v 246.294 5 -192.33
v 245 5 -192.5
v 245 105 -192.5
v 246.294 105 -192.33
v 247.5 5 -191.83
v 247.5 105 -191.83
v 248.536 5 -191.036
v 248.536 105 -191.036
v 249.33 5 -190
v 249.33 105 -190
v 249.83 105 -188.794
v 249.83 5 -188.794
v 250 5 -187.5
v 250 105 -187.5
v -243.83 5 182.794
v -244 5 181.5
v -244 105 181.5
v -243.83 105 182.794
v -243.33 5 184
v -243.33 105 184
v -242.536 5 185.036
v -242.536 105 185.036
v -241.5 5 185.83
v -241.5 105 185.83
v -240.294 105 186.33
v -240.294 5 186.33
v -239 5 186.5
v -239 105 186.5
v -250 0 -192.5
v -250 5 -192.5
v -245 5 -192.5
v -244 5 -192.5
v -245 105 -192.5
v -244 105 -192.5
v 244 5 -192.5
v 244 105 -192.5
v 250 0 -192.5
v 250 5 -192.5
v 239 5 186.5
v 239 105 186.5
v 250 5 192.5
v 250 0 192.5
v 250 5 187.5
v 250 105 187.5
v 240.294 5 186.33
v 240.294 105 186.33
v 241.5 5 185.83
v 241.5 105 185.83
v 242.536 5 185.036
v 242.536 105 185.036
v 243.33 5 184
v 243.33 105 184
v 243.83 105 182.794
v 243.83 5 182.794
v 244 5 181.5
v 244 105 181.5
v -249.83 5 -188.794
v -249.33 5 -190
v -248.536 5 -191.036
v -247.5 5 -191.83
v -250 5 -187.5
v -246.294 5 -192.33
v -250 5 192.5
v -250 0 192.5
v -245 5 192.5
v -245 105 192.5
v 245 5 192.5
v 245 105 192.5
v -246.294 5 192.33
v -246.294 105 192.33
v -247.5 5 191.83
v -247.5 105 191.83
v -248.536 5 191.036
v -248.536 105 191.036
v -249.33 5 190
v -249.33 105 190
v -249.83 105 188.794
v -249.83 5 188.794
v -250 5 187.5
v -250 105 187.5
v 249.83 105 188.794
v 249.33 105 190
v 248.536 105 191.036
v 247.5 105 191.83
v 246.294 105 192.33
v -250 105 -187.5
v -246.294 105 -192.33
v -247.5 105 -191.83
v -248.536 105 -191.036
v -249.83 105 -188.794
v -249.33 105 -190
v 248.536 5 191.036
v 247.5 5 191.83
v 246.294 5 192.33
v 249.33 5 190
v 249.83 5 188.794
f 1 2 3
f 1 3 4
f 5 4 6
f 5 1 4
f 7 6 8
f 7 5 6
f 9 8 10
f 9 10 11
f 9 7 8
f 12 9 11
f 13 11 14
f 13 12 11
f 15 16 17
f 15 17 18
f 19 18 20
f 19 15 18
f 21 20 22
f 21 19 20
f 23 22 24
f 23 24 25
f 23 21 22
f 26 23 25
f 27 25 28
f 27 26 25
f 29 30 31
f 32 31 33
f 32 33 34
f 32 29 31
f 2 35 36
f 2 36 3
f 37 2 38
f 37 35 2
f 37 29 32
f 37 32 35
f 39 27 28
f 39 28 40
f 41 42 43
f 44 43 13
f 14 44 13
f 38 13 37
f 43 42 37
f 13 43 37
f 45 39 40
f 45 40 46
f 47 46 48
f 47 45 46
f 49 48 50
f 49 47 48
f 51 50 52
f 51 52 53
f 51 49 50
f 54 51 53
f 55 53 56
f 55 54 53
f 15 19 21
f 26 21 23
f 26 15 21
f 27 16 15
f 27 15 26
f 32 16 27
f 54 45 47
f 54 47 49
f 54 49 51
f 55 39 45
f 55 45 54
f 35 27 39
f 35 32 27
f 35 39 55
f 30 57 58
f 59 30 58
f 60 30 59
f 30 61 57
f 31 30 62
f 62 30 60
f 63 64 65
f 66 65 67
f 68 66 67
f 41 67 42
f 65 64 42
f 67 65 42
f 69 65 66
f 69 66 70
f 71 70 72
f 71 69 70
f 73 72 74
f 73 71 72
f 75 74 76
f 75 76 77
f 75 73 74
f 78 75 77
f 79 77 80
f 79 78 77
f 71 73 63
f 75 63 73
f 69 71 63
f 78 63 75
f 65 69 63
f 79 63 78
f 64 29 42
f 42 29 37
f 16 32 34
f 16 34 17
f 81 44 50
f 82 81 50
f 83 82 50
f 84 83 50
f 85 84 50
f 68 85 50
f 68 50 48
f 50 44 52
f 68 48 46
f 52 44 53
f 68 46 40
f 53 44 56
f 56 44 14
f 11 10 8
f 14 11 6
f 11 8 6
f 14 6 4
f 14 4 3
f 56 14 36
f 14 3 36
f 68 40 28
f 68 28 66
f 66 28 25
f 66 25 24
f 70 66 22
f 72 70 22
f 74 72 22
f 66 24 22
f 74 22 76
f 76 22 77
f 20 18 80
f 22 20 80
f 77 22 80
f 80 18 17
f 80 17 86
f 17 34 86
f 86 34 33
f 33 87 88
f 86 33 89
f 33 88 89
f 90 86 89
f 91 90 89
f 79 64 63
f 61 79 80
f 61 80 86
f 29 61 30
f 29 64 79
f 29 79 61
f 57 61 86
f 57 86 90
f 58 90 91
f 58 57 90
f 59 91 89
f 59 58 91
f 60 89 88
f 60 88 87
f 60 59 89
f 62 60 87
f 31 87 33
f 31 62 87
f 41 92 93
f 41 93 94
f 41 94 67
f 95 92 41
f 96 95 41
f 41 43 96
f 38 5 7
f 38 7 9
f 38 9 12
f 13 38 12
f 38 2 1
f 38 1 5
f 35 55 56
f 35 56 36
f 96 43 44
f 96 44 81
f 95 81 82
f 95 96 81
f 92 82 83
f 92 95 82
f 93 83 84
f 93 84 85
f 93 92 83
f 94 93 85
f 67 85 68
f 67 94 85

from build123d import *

# Parameters (mm, degrees)
CROQUIS1_W              = 500
CROQUIS1_H              = 385
SALIENTE_EXTRUIR1_DEPTH = 5
SALIENTE_EXTRUIR2_DEPTH = 100


with BuildPart() as part:
    # Croquis1 → Saliente-Extruir1 (new body)
    with BuildSketch(Plane(origin=(0, 0, 0), x_dir=(1, 0, 0), z_dir=(0, 1, 0))):
        Rectangle(CROQUIS1_W, CROQUIS1_H)
    extrude(amount=SALIENTE_EXTRUIR1_DEPTH)

    # Croquis2 → Saliente-Extruir2 (add)
    with BuildSketch(Plane(origin=(0, 5, 0), x_dir=(1, 0, 0), z_dir=(0, 1, 0))):
        with BuildLine():
            Line((-244, 186.5), (-244, -181.5))
            ThreePointArc((-244, -181.5), (-242.535533906, -185.035533906), (-239, -186.5))
            Line((-239, -186.5), (239, -186.5))
            ThreePointArc((239, -186.5), (242.535533906, -185.035533906), (244, -181.5))
            Line((244, -181.5), (244, 186.5))
            Line((244, 186.5), (244, 192.5))
            Line((244, 192.5), (245, 192.5))
            ThreePointArc((245, 192.5), (248.535533906, 191.035533906), (250, 187.5))
            Line((250, 187.5), (250, -187.5))
            ThreePointArc((250, -187.5), (248.535533906, -191.035533906), (245, -192.5))
            Line((245, -192.5), (-245, -192.5))
            ThreePointArc((-245, -192.5), (-248.535533906, -191.035533906), (-250, -187.5))
            Line((-250, -187.5), (-250, 187.5))
            ThreePointArc((-250, 187.5), (-248.535533906, 191.035533906), (-245, 192.5))
            Line((-245, 192.5), (-244, 192.5))
            Line((-244, 192.5), (-244, 186.5))
        make_face()
    extrude(amount=SALIENTE_EXTRUIR2_DEPTH)


solid = part.part
